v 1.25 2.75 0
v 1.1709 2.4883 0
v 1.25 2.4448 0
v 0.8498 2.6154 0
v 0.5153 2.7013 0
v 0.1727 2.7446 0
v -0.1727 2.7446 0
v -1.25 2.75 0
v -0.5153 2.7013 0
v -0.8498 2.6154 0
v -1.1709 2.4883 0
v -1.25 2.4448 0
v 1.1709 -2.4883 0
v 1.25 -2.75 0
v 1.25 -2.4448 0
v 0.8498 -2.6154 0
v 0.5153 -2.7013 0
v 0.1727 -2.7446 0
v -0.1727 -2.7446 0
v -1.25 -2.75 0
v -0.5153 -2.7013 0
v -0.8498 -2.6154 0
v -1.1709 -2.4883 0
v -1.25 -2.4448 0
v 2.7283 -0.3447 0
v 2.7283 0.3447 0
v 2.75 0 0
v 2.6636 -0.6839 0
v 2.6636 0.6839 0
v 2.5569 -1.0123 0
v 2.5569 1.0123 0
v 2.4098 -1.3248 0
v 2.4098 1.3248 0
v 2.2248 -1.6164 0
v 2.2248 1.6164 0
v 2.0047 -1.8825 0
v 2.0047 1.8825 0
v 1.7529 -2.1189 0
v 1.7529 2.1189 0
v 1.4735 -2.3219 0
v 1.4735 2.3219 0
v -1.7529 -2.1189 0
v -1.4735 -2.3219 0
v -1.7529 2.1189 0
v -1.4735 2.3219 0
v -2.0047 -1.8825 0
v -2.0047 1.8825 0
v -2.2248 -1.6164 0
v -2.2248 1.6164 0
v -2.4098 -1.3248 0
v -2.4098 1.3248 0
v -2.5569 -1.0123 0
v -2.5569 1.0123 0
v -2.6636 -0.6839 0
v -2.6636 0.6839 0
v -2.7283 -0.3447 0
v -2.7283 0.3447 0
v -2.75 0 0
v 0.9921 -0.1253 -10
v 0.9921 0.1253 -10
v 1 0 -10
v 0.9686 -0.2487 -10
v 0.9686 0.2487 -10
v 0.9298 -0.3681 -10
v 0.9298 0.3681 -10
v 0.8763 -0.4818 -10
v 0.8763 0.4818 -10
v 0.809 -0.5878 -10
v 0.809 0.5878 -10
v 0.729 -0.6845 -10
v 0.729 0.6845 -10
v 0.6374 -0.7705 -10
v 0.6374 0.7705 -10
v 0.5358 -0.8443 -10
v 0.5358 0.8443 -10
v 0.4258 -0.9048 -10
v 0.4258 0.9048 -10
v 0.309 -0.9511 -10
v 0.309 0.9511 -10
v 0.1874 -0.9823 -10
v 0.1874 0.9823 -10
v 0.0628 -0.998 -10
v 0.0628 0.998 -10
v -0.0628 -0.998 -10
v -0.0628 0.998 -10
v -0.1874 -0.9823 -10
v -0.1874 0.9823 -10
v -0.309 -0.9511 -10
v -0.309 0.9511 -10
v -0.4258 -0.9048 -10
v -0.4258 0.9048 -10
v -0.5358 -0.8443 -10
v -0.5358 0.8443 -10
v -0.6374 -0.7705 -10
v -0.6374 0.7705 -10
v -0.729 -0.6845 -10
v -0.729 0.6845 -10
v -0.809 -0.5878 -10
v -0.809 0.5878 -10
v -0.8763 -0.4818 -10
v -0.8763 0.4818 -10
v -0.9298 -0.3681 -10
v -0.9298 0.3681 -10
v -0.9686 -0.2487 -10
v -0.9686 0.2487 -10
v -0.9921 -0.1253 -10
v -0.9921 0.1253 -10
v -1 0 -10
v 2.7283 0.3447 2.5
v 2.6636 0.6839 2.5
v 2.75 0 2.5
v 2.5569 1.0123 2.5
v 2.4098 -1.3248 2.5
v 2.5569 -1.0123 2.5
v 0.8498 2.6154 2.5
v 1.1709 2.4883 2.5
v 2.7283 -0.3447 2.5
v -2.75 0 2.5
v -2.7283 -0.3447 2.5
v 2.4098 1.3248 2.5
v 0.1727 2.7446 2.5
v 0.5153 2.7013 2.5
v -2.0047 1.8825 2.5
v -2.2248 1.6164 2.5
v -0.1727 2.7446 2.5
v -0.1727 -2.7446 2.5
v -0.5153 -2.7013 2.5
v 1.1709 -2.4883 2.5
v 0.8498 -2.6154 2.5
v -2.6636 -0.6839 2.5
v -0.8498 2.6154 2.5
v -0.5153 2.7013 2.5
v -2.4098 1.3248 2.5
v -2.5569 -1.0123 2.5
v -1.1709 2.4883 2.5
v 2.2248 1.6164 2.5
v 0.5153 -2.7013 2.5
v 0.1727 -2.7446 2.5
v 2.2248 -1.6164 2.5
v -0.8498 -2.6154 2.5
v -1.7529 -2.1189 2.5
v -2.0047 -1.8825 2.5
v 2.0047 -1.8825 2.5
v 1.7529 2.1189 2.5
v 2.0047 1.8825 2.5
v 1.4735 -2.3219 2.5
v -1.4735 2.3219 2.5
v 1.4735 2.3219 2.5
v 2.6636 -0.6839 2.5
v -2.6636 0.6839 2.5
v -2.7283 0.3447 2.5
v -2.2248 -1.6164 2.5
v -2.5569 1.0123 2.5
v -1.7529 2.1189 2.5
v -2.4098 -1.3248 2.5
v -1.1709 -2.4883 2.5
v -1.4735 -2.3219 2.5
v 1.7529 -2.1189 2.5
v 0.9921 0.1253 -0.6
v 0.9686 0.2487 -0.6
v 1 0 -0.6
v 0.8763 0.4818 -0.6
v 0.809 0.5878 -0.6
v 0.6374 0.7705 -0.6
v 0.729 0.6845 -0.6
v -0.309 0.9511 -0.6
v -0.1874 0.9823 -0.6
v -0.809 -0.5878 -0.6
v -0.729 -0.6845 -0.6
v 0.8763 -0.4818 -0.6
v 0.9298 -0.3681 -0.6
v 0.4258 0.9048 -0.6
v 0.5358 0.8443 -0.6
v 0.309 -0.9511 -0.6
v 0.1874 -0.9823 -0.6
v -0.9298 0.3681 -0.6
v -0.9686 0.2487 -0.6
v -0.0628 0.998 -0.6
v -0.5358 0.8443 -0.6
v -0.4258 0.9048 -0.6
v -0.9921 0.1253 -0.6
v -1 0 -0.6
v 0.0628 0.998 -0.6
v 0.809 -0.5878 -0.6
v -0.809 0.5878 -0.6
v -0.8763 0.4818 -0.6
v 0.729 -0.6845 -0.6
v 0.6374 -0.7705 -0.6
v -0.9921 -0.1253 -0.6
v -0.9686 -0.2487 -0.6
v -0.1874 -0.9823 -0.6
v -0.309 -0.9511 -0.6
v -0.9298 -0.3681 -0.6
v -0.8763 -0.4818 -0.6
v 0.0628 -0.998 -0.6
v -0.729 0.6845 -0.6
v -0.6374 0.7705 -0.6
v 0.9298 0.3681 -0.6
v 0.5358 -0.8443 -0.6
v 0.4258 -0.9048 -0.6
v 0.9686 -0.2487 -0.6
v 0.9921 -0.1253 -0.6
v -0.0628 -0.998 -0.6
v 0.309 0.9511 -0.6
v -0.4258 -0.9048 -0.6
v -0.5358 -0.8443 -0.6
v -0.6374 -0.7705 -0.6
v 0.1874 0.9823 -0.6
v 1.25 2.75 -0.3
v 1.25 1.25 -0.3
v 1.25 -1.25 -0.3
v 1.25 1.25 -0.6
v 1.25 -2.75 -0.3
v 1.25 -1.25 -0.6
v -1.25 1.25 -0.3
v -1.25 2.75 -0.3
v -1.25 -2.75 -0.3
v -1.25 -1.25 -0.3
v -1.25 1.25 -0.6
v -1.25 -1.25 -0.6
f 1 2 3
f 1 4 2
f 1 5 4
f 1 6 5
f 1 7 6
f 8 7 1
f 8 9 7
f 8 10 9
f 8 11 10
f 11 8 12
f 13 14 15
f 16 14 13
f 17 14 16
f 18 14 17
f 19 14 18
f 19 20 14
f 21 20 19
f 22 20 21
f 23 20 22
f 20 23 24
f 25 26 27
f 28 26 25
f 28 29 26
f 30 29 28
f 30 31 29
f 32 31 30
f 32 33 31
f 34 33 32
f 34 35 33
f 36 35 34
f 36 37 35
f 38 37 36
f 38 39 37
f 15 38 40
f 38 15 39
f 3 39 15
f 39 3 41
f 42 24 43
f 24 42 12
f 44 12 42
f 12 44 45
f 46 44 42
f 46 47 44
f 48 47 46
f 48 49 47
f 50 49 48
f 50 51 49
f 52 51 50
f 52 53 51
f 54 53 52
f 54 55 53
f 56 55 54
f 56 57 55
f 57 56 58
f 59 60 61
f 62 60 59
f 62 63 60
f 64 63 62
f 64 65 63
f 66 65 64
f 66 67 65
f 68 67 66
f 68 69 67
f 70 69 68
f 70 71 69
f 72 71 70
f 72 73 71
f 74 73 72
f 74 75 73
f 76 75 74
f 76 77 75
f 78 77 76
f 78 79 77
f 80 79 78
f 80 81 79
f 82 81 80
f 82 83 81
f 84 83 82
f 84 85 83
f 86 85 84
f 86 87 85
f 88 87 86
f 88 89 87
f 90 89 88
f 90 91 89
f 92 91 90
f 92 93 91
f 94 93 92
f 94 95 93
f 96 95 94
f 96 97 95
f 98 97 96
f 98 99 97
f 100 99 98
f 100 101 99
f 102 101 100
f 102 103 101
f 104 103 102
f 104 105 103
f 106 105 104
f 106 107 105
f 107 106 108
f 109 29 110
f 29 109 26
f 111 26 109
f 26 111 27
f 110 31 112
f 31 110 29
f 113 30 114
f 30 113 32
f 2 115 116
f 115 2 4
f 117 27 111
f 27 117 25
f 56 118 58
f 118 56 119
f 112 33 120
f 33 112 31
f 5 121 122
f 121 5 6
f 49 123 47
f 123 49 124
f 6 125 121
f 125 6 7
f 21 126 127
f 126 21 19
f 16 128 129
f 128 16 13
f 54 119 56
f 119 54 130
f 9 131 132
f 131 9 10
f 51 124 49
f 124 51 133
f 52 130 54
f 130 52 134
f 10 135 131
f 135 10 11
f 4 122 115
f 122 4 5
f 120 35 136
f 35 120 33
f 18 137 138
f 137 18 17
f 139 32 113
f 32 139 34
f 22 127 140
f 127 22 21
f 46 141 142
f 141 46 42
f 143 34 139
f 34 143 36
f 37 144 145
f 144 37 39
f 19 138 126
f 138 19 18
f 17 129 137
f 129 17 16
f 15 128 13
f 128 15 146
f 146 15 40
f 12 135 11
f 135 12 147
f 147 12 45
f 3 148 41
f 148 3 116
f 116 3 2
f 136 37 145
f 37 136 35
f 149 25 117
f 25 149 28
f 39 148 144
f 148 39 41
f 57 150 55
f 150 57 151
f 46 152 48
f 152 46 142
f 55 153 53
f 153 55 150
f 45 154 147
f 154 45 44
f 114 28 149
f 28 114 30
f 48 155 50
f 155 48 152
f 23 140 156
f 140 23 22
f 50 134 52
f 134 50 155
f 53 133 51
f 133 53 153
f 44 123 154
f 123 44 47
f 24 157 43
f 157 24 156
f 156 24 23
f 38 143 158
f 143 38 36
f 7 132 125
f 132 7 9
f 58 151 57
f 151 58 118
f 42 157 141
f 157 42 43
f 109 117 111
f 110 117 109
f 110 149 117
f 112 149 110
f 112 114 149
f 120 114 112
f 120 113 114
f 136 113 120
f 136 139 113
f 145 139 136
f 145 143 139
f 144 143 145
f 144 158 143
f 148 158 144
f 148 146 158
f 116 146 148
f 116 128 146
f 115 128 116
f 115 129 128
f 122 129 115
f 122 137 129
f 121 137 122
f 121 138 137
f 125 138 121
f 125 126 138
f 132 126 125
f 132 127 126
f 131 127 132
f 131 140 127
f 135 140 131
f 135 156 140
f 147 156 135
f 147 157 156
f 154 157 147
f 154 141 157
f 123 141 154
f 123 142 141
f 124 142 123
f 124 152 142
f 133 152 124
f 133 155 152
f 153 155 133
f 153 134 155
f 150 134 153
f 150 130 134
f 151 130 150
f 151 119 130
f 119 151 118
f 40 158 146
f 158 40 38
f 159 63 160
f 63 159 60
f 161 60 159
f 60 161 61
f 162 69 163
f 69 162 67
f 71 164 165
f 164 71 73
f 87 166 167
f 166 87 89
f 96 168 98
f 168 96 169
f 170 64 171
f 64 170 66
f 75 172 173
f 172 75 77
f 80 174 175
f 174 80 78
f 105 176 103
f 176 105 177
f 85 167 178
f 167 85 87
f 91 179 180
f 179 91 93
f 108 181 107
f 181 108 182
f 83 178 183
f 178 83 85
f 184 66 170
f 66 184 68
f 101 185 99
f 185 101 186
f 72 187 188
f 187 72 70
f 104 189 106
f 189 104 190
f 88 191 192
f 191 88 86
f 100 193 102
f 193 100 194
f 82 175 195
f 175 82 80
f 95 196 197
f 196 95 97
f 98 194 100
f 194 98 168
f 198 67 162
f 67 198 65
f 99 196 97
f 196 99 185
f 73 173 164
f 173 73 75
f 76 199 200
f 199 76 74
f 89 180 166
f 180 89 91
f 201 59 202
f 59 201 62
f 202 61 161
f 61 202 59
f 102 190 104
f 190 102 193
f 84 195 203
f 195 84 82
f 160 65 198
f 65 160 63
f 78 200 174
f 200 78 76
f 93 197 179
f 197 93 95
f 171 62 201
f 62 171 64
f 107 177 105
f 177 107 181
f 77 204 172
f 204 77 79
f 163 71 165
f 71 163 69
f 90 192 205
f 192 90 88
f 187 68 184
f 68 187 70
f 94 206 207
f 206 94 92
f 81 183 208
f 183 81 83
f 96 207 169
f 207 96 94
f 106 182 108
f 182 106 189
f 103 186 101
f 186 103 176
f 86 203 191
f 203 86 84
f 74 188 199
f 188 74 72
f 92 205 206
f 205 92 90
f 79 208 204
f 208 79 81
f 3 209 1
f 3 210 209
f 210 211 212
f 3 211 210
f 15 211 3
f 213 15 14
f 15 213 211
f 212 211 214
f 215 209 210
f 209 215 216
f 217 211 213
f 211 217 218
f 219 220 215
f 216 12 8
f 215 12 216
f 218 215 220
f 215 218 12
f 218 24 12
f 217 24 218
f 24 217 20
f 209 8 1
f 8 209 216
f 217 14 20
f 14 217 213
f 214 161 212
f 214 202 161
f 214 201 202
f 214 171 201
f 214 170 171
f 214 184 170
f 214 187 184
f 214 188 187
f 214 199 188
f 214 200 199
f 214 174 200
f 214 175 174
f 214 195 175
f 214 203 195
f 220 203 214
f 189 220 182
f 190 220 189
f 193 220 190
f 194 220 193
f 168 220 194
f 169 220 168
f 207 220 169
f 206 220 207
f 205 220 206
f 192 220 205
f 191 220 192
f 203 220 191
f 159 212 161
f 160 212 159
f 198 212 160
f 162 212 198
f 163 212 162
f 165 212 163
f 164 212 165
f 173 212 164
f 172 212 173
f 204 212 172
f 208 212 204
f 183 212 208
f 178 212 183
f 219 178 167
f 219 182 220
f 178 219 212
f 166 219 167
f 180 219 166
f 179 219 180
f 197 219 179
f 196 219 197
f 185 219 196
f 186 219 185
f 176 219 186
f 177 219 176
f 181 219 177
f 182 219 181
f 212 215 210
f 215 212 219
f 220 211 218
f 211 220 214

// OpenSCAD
$fn = 50;


difference() {
	union() {
		translate(v = [0, 0, 0]) {
			rotate(a = [0, 0, 0]) {
				difference() {
					union() {
						translate(v = [0, 0, -10.0000000000]) {
							cylinder(h = 10, r = 0.7500000000);
						}
						cylinder(h = 2.5000000000, r = 2.7500000000);
						translate(v = [0, 0, -10.0000000000]) {
							cylinder(h = 10, r = 1.0000000000);
						}
						translate(v = [-1.2500000000, -2.7500000000, -0.3000000000]) {
							cube(size = [2.5000000000, 5.5000000000, 0.3000000000]);
						}
						translate(v = [-1.2500000000, -1.2500000000, -0.6000000000]) {
							cube(size = [2.5000000000, 2.5000000000, 0.3000000000]);
						}
						translate(v = [0, 0, -10.0000000000]) {
							cylinder(h = 10, r = 0.7500000000);
						}
					}
					union();
				}
			}
		}
	}
	union();
}
